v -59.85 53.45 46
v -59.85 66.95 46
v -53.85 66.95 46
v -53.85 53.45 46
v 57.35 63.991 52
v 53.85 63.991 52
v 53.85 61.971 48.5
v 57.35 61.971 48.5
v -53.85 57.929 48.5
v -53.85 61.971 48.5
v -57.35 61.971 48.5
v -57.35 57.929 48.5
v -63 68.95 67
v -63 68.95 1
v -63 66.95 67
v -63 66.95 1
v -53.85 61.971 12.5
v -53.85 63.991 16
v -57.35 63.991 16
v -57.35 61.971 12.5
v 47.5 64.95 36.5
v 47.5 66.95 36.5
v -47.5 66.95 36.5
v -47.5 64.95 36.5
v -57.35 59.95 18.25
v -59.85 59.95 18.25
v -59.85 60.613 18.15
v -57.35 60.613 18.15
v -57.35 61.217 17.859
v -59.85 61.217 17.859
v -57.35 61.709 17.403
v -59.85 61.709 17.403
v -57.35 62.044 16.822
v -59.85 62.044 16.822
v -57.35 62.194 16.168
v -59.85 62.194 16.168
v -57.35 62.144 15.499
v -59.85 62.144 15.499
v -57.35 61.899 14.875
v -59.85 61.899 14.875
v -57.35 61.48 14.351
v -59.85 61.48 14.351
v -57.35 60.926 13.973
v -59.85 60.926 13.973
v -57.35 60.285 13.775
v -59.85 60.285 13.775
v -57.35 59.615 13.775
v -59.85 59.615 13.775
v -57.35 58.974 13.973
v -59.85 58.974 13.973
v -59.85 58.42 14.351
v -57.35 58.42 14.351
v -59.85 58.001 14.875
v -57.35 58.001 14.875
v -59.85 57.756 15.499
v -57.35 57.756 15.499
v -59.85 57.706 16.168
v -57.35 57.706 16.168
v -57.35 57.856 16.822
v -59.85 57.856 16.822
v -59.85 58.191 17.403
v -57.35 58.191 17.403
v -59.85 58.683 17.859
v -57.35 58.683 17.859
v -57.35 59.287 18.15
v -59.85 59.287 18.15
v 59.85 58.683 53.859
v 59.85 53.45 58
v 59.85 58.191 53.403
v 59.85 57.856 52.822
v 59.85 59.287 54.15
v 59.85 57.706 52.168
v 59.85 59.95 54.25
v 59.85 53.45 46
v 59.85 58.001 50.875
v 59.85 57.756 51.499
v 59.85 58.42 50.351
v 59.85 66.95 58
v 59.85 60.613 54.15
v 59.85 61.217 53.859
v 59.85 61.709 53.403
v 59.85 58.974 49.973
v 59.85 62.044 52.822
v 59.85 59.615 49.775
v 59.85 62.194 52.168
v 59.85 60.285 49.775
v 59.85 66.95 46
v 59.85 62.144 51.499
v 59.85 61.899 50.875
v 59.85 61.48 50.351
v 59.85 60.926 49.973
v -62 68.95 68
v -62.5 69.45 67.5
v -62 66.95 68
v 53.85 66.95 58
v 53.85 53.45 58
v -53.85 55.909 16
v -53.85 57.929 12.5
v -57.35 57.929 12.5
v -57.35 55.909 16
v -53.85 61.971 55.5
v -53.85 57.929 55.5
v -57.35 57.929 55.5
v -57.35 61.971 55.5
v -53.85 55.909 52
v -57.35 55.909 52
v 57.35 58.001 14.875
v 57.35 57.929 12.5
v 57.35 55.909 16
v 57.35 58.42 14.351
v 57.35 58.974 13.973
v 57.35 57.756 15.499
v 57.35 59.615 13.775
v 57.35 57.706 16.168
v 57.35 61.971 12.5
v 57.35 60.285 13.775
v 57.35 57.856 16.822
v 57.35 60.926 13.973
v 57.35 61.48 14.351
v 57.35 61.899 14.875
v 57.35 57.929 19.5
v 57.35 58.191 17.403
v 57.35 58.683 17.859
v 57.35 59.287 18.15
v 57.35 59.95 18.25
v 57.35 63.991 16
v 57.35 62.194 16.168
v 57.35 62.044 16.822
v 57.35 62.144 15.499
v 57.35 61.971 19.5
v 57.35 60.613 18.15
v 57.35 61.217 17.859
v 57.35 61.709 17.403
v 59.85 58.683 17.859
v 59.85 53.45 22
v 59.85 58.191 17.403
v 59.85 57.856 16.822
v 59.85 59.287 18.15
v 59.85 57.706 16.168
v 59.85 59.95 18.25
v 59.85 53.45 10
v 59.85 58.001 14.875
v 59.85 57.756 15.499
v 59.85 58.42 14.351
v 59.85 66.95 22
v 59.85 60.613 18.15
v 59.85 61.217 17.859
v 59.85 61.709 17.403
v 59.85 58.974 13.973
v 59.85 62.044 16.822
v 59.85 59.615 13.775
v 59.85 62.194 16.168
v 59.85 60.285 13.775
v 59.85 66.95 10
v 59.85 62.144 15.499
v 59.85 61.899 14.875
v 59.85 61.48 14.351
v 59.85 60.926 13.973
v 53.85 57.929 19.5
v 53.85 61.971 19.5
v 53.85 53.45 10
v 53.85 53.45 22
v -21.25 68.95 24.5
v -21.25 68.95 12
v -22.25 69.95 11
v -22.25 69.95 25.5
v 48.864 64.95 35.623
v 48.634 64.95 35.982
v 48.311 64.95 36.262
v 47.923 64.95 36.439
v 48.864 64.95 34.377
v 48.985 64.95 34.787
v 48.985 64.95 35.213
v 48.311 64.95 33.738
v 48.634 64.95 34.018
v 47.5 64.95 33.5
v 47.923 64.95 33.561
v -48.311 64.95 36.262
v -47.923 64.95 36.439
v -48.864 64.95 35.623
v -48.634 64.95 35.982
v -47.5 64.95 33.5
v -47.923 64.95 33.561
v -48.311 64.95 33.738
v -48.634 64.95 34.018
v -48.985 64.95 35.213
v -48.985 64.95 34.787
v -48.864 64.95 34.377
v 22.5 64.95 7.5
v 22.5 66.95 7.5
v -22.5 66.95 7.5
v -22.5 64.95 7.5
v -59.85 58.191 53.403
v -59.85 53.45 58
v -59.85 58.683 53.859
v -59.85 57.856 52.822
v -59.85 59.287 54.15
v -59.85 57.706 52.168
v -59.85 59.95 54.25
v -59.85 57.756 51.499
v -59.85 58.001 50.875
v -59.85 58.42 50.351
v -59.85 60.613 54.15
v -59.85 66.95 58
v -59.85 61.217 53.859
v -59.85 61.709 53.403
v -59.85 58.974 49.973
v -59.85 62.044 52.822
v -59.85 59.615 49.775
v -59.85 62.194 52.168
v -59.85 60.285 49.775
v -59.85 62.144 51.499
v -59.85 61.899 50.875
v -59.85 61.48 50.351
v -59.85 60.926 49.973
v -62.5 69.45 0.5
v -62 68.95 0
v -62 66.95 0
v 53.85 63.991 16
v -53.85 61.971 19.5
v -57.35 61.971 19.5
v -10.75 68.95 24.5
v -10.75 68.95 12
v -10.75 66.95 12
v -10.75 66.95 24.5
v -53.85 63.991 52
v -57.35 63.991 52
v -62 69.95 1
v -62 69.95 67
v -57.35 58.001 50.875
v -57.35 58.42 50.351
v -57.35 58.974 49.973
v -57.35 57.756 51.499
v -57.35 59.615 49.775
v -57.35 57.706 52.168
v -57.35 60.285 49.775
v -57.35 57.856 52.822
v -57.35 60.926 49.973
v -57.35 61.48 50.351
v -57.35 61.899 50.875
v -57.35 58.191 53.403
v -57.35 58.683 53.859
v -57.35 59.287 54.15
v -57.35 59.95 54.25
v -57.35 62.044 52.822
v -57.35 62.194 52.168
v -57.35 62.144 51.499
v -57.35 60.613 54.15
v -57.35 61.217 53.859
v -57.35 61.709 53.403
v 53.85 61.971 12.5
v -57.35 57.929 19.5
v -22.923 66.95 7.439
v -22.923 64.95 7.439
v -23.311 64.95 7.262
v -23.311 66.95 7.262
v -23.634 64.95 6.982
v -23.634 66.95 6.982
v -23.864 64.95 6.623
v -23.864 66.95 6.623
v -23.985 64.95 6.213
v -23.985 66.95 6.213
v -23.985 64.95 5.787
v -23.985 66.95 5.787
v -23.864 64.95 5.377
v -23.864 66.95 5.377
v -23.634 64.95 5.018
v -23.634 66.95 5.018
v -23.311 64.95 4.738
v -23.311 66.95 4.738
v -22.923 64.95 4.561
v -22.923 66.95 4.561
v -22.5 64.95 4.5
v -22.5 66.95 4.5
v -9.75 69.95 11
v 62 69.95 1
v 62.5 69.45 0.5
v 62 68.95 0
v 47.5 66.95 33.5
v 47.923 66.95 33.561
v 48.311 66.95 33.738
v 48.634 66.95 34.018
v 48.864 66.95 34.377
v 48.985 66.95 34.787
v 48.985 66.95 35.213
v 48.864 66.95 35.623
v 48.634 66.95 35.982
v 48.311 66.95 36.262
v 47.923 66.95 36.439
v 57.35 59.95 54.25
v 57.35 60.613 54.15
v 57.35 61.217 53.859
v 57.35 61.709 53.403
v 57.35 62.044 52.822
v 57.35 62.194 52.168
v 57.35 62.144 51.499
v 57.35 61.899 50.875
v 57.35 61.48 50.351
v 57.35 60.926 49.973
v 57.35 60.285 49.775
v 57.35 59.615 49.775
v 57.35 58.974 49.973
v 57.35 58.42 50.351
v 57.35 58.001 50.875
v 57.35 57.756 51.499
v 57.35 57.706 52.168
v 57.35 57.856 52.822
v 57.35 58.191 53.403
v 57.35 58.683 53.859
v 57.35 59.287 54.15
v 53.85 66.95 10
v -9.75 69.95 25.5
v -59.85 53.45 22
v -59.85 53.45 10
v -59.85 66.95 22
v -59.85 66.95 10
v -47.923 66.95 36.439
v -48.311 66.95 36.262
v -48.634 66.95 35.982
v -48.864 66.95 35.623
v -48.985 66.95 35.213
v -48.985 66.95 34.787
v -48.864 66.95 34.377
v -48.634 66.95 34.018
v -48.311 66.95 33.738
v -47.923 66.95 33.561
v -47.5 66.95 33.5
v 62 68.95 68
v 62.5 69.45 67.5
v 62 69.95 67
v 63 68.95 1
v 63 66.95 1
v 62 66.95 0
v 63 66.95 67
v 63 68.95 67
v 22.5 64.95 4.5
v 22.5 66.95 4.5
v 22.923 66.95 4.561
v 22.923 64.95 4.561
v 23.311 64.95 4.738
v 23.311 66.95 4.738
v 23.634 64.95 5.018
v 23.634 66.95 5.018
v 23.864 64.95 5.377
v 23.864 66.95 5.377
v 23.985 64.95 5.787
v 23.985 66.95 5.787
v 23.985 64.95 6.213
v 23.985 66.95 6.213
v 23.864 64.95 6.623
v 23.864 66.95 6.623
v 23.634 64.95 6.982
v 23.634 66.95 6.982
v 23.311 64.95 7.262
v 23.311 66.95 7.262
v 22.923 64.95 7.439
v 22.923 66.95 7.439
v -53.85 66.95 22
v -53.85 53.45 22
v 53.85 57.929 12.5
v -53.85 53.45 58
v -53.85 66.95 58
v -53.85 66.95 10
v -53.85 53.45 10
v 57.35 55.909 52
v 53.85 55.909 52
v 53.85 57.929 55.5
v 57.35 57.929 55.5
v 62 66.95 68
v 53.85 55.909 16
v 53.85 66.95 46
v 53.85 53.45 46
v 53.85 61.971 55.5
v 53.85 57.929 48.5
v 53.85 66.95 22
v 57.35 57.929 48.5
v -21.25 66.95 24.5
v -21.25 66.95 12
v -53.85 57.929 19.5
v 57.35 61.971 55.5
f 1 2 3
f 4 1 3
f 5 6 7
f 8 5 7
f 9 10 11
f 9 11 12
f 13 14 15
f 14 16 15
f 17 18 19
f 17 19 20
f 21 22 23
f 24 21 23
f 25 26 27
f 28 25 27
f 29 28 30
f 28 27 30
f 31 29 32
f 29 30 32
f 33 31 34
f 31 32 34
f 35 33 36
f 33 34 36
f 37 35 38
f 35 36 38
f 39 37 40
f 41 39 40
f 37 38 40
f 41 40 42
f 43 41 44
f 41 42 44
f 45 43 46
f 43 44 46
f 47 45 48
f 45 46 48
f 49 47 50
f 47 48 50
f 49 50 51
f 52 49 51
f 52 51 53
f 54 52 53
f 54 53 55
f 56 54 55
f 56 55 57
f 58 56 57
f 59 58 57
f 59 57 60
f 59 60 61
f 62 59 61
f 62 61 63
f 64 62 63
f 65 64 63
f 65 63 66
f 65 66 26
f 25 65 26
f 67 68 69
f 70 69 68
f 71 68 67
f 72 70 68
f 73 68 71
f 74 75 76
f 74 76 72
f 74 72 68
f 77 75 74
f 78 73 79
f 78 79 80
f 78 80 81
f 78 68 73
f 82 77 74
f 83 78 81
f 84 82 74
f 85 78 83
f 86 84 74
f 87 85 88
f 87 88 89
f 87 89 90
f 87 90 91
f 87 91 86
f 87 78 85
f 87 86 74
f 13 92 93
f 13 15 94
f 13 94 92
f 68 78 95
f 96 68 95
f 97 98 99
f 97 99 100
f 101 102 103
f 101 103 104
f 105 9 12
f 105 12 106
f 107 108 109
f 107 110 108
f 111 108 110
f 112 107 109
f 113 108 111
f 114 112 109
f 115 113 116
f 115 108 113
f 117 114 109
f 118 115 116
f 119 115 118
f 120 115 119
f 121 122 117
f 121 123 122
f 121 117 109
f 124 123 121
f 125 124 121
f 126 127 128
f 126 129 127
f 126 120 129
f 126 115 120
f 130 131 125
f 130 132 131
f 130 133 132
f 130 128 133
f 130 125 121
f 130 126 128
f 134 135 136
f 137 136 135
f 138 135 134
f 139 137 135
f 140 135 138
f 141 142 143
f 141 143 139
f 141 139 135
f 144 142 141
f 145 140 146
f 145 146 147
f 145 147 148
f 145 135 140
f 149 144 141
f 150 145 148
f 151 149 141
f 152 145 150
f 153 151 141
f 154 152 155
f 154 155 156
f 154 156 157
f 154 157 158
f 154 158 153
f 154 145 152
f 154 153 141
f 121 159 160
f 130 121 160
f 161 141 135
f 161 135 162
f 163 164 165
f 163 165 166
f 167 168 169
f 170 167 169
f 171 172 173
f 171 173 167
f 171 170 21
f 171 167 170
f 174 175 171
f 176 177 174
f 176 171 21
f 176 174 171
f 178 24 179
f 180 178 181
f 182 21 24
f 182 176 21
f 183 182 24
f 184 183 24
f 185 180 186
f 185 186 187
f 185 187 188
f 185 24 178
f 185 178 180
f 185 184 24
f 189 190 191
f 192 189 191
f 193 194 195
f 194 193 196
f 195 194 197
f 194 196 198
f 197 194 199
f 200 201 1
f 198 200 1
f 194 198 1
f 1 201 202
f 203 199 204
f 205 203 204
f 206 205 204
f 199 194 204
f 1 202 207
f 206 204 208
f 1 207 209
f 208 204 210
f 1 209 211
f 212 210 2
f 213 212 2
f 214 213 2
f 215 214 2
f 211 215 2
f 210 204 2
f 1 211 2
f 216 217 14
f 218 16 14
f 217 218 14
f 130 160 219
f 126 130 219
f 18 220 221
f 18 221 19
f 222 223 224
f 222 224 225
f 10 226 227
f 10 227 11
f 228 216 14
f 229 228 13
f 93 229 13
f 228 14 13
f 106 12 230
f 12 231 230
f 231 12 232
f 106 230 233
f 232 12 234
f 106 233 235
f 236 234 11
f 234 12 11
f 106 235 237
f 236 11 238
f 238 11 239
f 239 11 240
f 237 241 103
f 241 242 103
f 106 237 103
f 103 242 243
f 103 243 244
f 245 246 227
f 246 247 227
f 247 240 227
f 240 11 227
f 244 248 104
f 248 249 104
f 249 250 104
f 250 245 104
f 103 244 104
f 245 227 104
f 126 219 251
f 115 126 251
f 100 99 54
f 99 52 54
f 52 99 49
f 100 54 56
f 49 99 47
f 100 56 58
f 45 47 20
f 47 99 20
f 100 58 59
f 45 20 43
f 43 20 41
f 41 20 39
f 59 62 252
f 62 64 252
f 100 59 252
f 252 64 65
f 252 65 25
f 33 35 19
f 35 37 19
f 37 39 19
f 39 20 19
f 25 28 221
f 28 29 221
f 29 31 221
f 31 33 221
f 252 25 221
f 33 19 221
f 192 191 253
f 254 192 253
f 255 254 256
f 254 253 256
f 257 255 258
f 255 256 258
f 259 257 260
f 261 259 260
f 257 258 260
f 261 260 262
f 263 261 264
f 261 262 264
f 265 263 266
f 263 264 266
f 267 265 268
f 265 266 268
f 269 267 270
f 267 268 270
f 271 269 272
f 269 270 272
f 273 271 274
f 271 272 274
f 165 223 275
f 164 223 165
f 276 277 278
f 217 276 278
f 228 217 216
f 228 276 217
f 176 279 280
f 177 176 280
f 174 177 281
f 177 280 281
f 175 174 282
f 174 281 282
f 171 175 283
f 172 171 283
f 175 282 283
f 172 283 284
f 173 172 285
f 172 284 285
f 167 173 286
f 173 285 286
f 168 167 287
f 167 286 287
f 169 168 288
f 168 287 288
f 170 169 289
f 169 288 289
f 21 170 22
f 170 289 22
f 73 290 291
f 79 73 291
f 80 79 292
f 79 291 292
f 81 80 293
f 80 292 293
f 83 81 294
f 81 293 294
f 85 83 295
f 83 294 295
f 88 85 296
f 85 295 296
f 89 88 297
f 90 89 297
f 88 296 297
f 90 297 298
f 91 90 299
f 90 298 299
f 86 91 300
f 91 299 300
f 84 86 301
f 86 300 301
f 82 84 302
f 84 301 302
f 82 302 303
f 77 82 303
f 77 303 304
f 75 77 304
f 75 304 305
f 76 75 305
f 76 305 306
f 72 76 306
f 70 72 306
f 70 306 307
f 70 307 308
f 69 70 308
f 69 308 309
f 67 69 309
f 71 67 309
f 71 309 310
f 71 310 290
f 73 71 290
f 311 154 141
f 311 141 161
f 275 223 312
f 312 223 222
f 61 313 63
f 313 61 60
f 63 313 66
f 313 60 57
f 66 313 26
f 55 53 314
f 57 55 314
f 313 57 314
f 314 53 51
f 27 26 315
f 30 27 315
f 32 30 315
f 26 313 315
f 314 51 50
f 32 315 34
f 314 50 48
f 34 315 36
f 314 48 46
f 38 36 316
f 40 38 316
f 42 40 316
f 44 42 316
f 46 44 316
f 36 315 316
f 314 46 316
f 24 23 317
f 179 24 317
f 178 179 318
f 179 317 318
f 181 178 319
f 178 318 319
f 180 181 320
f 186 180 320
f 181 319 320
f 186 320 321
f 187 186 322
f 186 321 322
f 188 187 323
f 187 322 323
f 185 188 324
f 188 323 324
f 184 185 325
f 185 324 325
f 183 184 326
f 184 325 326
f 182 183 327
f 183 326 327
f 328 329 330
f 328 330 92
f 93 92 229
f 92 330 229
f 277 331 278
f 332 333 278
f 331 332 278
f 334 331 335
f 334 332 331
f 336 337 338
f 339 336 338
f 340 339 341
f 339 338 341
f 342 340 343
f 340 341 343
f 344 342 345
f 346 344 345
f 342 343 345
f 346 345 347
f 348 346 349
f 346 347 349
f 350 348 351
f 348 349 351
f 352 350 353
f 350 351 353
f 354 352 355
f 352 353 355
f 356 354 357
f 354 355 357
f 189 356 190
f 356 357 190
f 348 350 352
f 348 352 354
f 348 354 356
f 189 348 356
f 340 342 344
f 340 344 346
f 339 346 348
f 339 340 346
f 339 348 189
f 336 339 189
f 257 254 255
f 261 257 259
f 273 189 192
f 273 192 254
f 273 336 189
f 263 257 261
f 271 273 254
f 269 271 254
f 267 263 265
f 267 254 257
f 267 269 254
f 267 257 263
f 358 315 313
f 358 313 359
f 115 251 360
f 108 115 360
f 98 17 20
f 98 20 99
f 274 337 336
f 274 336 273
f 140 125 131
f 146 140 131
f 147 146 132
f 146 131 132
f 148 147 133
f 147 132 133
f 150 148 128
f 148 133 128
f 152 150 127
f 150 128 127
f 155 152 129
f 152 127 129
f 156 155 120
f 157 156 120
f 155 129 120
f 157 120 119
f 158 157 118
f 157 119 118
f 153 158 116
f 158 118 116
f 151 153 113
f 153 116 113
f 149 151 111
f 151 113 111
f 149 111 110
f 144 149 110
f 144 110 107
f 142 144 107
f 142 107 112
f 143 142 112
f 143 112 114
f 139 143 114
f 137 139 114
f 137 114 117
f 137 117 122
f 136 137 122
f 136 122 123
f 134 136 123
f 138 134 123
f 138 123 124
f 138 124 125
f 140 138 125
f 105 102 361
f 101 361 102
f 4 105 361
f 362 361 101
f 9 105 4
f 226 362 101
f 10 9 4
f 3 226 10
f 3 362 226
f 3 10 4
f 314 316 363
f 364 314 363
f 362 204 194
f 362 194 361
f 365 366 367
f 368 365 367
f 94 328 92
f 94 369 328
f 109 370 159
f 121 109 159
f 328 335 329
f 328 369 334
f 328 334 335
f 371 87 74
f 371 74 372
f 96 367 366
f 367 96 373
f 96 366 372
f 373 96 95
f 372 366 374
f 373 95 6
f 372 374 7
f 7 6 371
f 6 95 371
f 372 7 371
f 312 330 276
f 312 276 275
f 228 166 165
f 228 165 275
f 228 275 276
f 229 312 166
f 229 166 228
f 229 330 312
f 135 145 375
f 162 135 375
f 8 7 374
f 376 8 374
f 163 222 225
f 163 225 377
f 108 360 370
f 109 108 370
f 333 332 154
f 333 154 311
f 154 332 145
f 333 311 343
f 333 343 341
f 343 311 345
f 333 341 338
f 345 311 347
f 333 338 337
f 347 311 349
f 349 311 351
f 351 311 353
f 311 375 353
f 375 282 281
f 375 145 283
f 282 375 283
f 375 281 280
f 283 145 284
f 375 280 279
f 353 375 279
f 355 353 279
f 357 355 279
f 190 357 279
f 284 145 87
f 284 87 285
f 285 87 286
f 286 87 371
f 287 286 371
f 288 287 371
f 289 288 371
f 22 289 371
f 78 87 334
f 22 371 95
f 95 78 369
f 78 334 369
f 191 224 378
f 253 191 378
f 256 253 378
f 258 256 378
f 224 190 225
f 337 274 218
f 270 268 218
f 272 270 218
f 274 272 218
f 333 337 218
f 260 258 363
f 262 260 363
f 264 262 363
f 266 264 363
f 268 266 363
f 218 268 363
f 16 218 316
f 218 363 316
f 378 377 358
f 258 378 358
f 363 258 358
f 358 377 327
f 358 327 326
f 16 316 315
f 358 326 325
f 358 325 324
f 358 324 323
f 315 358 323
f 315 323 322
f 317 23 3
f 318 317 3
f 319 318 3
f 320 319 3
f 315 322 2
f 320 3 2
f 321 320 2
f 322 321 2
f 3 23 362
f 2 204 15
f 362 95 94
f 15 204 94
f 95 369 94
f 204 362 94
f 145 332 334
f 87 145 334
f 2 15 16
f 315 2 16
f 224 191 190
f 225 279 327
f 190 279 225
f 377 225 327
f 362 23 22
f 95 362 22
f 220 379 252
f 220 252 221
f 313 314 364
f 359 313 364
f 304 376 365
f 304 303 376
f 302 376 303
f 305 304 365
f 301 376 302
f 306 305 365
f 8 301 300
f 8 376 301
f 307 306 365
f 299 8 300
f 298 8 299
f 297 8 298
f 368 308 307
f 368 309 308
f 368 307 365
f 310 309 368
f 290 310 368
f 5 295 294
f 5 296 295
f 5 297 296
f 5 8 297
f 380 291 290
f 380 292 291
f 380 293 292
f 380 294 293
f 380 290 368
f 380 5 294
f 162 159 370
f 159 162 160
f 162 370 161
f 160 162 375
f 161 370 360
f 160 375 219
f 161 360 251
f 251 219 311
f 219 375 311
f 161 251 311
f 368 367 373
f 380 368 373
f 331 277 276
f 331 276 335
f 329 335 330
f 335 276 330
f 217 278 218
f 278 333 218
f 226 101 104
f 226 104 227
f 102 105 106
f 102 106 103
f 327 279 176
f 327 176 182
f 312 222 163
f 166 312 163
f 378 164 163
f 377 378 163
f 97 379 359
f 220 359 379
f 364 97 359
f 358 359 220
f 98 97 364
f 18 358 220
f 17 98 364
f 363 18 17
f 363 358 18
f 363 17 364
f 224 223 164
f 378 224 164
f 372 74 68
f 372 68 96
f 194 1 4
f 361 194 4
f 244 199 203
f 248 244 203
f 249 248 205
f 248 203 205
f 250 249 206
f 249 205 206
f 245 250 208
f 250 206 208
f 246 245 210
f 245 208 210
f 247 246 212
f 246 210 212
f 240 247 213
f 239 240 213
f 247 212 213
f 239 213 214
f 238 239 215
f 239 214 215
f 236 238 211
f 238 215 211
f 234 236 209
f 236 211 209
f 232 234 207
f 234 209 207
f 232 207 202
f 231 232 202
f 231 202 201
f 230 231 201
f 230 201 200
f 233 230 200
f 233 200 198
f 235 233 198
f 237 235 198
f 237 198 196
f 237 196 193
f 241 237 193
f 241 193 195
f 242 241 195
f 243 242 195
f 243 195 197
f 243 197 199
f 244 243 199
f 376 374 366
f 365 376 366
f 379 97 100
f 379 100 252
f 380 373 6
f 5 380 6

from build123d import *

# Parameters (mm, degrees)
SKETCH018_W             = 126
SKETCH018_H             = 68
PAD008_DEPTH            = 3
SKETCH019_W             = 6
SKETCH019_H             = 12
PAD009_DEPTH            = 13.5
SKETCH020_R             = 2.25
POCKET009_DEPTH         = 122.851
POCKET010_DEPTH         = 3.5
SKETCH022_W             = 10.5
SKETCH022_H             = 12.5
POCKET011_DEPTH         = 16.501
CHAMFER002_SIZE         = 1
CHAMFER007_SIZE         = 1
CHAMFER009_SIZE         = 1
PAD015_DEPTH            = 2
BODY005_PLACEMENT_ANGLE = 180


with BuildPart() as part:
    # Sketch018 → Pad008 (new body)
    with BuildSketch(Plane.XZ):
        with Locations((0, 34)):
            Rectangle(SKETCH018_W, SKETCH018_H)
    extrude(amount=PAD008_DEPTH)

    # Sketch019 (on Face5 of Pad008) → Pad009 (join)
    with BuildSketch(Plane(origin=(0, 0, 0), x_dir=(1, 0, 0), z_dir=(0, 1, 0))):
        with Locations((-56.85, -16)):
            Rectangle(SKETCH019_W, SKETCH019_H)
        with Locations((-56.85, -52)):
            Rectangle(SKETCH019_W, SKETCH019_H)
    pad009 = extrude(amount=PAD009_DEPTH)

    # Mirrored004: Pad009 across YZ
    add(pad009.mirror(Plane.YZ))

    # Sketch020 (on Face22 of Mirrored004) → Pocket009 (cut, through all)
    with BuildSketch(Plane(origin=(59.85, 0, 0), x_dir=(0, 0, 1), z_dir=(1, 0, 0))):
        with Locations((16, -7)):
            Circle(SKETCH020_R)
        with Locations((52, -7)):
            Circle(SKETCH020_R)
    extrude(amount=-POCKET009_DEPTH, mode=Mode.SUBTRACT)

    # Sketch021 (on Face10 of Pocket009) → Pocket010 (cut)
    with BuildSketch(Plane(origin=(-53.85, 0, 0), x_dir=(0, 0, 1), z_dir=(1, 0, 0))):
        Polygon((19.5, -9.020726), (19.5, -4.979274), (16, -2.958548), (12.5, -4.979274), (12.5, -9.020726), (16, -11.041452), align=None)
        Polygon((55.5, -9.020726), (55.5, -4.979274), (52, -2.958548), (48.5, -4.979274), (48.5, -9.020726), (52, -11.041452), align=None)
    pocket010 = extrude(amount=-POCKET010_DEPTH, mode=Mode.SUBTRACT)

    # Sketch022 (on Face5 of Pocket010) → Pocket011 (cut, through all)
    with BuildSketch(Plane.XZ.offset(3)):
        with Locations((16, 18.25)):
            Rectangle(SKETCH022_W, SKETCH022_H)
    extrude(amount=-POCKET011_DEPTH, mode=Mode.SUBTRACT)

    # Chamfer002
    chamfer002_edges = [part.edges().sort_by_distance(p)[0] for p in [
        (0, -3, 68),
        (-63, -3, 34),
        (63, -3, 34),
        (0, -3, 0),
        (16, -3, 24.5),
        (21.25, -3, 18.25),
        (16, -3, 12),
        (10.75, -3, 18.25),
    ]]
    chamfer(chamfer002_edges, length=CHAMFER002_SIZE)

    # Chamfer007
    chamfer007_edges = [part.edges().sort_by_distance(p)[0] for p in [
        (-63, -1, 68),
        (63, -1, 68),
    ]]
    chamfer(chamfer007_edges, length=CHAMFER007_SIZE)

    # Chamfer009
    chamfer009_edges = [part.edges().sort_by_distance(p)[0] for p in [
        (-63, -1, 0),
        (63, -1, 0),
    ]]
    chamfer(chamfer009_edges, length=CHAMFER009_SIZE)

    # Mirrored006: Pocket010 across YZ
    add(pocket010.mirror(Plane.YZ), mode=Mode.SUBTRACT)

    # Sketch034 (on Face1 of Mirrored006) → Pad015 (join)
    with BuildSketch(Plane(origin=(0, 0, 0), x_dir=(1, 0, 0), z_dir=(0, 1, 0))):
        with BuildLine():
            ThreePointArc((-22.5, -4.5), (-24, -6), (-22.5, -7.5))
            Line((-22.5, -7.5), (22.5, -7.5))
            ThreePointArc((22.5, -7.5), (24, -6), (22.5, -4.5))
            Line((-22.5, -4.5), (22.5, -4.5))
        make_face()
        with BuildLine():
            ThreePointArc((-47.5, -33.5), (-49, -35), (-47.5, -36.5))
            Line((-47.5, -36.5), (47.5, -36.5))
            ThreePointArc((47.5, -36.5), (49, -35), (47.5, -33.5))
            Line((-47.5, -33.5), (47.5, -33.5))
        make_face()
    extrude(amount=PAD015_DEPTH)


with BuildPart() as part_1:
    # Body005 placement: moved
    add(part.part.moved(Location((0, 66.95, 0))).rotate(Axis((0, 66.95, 0), (0, 0, 1)), BODY005_PLACEMENT_ANGLE))


solid = part_1.part
